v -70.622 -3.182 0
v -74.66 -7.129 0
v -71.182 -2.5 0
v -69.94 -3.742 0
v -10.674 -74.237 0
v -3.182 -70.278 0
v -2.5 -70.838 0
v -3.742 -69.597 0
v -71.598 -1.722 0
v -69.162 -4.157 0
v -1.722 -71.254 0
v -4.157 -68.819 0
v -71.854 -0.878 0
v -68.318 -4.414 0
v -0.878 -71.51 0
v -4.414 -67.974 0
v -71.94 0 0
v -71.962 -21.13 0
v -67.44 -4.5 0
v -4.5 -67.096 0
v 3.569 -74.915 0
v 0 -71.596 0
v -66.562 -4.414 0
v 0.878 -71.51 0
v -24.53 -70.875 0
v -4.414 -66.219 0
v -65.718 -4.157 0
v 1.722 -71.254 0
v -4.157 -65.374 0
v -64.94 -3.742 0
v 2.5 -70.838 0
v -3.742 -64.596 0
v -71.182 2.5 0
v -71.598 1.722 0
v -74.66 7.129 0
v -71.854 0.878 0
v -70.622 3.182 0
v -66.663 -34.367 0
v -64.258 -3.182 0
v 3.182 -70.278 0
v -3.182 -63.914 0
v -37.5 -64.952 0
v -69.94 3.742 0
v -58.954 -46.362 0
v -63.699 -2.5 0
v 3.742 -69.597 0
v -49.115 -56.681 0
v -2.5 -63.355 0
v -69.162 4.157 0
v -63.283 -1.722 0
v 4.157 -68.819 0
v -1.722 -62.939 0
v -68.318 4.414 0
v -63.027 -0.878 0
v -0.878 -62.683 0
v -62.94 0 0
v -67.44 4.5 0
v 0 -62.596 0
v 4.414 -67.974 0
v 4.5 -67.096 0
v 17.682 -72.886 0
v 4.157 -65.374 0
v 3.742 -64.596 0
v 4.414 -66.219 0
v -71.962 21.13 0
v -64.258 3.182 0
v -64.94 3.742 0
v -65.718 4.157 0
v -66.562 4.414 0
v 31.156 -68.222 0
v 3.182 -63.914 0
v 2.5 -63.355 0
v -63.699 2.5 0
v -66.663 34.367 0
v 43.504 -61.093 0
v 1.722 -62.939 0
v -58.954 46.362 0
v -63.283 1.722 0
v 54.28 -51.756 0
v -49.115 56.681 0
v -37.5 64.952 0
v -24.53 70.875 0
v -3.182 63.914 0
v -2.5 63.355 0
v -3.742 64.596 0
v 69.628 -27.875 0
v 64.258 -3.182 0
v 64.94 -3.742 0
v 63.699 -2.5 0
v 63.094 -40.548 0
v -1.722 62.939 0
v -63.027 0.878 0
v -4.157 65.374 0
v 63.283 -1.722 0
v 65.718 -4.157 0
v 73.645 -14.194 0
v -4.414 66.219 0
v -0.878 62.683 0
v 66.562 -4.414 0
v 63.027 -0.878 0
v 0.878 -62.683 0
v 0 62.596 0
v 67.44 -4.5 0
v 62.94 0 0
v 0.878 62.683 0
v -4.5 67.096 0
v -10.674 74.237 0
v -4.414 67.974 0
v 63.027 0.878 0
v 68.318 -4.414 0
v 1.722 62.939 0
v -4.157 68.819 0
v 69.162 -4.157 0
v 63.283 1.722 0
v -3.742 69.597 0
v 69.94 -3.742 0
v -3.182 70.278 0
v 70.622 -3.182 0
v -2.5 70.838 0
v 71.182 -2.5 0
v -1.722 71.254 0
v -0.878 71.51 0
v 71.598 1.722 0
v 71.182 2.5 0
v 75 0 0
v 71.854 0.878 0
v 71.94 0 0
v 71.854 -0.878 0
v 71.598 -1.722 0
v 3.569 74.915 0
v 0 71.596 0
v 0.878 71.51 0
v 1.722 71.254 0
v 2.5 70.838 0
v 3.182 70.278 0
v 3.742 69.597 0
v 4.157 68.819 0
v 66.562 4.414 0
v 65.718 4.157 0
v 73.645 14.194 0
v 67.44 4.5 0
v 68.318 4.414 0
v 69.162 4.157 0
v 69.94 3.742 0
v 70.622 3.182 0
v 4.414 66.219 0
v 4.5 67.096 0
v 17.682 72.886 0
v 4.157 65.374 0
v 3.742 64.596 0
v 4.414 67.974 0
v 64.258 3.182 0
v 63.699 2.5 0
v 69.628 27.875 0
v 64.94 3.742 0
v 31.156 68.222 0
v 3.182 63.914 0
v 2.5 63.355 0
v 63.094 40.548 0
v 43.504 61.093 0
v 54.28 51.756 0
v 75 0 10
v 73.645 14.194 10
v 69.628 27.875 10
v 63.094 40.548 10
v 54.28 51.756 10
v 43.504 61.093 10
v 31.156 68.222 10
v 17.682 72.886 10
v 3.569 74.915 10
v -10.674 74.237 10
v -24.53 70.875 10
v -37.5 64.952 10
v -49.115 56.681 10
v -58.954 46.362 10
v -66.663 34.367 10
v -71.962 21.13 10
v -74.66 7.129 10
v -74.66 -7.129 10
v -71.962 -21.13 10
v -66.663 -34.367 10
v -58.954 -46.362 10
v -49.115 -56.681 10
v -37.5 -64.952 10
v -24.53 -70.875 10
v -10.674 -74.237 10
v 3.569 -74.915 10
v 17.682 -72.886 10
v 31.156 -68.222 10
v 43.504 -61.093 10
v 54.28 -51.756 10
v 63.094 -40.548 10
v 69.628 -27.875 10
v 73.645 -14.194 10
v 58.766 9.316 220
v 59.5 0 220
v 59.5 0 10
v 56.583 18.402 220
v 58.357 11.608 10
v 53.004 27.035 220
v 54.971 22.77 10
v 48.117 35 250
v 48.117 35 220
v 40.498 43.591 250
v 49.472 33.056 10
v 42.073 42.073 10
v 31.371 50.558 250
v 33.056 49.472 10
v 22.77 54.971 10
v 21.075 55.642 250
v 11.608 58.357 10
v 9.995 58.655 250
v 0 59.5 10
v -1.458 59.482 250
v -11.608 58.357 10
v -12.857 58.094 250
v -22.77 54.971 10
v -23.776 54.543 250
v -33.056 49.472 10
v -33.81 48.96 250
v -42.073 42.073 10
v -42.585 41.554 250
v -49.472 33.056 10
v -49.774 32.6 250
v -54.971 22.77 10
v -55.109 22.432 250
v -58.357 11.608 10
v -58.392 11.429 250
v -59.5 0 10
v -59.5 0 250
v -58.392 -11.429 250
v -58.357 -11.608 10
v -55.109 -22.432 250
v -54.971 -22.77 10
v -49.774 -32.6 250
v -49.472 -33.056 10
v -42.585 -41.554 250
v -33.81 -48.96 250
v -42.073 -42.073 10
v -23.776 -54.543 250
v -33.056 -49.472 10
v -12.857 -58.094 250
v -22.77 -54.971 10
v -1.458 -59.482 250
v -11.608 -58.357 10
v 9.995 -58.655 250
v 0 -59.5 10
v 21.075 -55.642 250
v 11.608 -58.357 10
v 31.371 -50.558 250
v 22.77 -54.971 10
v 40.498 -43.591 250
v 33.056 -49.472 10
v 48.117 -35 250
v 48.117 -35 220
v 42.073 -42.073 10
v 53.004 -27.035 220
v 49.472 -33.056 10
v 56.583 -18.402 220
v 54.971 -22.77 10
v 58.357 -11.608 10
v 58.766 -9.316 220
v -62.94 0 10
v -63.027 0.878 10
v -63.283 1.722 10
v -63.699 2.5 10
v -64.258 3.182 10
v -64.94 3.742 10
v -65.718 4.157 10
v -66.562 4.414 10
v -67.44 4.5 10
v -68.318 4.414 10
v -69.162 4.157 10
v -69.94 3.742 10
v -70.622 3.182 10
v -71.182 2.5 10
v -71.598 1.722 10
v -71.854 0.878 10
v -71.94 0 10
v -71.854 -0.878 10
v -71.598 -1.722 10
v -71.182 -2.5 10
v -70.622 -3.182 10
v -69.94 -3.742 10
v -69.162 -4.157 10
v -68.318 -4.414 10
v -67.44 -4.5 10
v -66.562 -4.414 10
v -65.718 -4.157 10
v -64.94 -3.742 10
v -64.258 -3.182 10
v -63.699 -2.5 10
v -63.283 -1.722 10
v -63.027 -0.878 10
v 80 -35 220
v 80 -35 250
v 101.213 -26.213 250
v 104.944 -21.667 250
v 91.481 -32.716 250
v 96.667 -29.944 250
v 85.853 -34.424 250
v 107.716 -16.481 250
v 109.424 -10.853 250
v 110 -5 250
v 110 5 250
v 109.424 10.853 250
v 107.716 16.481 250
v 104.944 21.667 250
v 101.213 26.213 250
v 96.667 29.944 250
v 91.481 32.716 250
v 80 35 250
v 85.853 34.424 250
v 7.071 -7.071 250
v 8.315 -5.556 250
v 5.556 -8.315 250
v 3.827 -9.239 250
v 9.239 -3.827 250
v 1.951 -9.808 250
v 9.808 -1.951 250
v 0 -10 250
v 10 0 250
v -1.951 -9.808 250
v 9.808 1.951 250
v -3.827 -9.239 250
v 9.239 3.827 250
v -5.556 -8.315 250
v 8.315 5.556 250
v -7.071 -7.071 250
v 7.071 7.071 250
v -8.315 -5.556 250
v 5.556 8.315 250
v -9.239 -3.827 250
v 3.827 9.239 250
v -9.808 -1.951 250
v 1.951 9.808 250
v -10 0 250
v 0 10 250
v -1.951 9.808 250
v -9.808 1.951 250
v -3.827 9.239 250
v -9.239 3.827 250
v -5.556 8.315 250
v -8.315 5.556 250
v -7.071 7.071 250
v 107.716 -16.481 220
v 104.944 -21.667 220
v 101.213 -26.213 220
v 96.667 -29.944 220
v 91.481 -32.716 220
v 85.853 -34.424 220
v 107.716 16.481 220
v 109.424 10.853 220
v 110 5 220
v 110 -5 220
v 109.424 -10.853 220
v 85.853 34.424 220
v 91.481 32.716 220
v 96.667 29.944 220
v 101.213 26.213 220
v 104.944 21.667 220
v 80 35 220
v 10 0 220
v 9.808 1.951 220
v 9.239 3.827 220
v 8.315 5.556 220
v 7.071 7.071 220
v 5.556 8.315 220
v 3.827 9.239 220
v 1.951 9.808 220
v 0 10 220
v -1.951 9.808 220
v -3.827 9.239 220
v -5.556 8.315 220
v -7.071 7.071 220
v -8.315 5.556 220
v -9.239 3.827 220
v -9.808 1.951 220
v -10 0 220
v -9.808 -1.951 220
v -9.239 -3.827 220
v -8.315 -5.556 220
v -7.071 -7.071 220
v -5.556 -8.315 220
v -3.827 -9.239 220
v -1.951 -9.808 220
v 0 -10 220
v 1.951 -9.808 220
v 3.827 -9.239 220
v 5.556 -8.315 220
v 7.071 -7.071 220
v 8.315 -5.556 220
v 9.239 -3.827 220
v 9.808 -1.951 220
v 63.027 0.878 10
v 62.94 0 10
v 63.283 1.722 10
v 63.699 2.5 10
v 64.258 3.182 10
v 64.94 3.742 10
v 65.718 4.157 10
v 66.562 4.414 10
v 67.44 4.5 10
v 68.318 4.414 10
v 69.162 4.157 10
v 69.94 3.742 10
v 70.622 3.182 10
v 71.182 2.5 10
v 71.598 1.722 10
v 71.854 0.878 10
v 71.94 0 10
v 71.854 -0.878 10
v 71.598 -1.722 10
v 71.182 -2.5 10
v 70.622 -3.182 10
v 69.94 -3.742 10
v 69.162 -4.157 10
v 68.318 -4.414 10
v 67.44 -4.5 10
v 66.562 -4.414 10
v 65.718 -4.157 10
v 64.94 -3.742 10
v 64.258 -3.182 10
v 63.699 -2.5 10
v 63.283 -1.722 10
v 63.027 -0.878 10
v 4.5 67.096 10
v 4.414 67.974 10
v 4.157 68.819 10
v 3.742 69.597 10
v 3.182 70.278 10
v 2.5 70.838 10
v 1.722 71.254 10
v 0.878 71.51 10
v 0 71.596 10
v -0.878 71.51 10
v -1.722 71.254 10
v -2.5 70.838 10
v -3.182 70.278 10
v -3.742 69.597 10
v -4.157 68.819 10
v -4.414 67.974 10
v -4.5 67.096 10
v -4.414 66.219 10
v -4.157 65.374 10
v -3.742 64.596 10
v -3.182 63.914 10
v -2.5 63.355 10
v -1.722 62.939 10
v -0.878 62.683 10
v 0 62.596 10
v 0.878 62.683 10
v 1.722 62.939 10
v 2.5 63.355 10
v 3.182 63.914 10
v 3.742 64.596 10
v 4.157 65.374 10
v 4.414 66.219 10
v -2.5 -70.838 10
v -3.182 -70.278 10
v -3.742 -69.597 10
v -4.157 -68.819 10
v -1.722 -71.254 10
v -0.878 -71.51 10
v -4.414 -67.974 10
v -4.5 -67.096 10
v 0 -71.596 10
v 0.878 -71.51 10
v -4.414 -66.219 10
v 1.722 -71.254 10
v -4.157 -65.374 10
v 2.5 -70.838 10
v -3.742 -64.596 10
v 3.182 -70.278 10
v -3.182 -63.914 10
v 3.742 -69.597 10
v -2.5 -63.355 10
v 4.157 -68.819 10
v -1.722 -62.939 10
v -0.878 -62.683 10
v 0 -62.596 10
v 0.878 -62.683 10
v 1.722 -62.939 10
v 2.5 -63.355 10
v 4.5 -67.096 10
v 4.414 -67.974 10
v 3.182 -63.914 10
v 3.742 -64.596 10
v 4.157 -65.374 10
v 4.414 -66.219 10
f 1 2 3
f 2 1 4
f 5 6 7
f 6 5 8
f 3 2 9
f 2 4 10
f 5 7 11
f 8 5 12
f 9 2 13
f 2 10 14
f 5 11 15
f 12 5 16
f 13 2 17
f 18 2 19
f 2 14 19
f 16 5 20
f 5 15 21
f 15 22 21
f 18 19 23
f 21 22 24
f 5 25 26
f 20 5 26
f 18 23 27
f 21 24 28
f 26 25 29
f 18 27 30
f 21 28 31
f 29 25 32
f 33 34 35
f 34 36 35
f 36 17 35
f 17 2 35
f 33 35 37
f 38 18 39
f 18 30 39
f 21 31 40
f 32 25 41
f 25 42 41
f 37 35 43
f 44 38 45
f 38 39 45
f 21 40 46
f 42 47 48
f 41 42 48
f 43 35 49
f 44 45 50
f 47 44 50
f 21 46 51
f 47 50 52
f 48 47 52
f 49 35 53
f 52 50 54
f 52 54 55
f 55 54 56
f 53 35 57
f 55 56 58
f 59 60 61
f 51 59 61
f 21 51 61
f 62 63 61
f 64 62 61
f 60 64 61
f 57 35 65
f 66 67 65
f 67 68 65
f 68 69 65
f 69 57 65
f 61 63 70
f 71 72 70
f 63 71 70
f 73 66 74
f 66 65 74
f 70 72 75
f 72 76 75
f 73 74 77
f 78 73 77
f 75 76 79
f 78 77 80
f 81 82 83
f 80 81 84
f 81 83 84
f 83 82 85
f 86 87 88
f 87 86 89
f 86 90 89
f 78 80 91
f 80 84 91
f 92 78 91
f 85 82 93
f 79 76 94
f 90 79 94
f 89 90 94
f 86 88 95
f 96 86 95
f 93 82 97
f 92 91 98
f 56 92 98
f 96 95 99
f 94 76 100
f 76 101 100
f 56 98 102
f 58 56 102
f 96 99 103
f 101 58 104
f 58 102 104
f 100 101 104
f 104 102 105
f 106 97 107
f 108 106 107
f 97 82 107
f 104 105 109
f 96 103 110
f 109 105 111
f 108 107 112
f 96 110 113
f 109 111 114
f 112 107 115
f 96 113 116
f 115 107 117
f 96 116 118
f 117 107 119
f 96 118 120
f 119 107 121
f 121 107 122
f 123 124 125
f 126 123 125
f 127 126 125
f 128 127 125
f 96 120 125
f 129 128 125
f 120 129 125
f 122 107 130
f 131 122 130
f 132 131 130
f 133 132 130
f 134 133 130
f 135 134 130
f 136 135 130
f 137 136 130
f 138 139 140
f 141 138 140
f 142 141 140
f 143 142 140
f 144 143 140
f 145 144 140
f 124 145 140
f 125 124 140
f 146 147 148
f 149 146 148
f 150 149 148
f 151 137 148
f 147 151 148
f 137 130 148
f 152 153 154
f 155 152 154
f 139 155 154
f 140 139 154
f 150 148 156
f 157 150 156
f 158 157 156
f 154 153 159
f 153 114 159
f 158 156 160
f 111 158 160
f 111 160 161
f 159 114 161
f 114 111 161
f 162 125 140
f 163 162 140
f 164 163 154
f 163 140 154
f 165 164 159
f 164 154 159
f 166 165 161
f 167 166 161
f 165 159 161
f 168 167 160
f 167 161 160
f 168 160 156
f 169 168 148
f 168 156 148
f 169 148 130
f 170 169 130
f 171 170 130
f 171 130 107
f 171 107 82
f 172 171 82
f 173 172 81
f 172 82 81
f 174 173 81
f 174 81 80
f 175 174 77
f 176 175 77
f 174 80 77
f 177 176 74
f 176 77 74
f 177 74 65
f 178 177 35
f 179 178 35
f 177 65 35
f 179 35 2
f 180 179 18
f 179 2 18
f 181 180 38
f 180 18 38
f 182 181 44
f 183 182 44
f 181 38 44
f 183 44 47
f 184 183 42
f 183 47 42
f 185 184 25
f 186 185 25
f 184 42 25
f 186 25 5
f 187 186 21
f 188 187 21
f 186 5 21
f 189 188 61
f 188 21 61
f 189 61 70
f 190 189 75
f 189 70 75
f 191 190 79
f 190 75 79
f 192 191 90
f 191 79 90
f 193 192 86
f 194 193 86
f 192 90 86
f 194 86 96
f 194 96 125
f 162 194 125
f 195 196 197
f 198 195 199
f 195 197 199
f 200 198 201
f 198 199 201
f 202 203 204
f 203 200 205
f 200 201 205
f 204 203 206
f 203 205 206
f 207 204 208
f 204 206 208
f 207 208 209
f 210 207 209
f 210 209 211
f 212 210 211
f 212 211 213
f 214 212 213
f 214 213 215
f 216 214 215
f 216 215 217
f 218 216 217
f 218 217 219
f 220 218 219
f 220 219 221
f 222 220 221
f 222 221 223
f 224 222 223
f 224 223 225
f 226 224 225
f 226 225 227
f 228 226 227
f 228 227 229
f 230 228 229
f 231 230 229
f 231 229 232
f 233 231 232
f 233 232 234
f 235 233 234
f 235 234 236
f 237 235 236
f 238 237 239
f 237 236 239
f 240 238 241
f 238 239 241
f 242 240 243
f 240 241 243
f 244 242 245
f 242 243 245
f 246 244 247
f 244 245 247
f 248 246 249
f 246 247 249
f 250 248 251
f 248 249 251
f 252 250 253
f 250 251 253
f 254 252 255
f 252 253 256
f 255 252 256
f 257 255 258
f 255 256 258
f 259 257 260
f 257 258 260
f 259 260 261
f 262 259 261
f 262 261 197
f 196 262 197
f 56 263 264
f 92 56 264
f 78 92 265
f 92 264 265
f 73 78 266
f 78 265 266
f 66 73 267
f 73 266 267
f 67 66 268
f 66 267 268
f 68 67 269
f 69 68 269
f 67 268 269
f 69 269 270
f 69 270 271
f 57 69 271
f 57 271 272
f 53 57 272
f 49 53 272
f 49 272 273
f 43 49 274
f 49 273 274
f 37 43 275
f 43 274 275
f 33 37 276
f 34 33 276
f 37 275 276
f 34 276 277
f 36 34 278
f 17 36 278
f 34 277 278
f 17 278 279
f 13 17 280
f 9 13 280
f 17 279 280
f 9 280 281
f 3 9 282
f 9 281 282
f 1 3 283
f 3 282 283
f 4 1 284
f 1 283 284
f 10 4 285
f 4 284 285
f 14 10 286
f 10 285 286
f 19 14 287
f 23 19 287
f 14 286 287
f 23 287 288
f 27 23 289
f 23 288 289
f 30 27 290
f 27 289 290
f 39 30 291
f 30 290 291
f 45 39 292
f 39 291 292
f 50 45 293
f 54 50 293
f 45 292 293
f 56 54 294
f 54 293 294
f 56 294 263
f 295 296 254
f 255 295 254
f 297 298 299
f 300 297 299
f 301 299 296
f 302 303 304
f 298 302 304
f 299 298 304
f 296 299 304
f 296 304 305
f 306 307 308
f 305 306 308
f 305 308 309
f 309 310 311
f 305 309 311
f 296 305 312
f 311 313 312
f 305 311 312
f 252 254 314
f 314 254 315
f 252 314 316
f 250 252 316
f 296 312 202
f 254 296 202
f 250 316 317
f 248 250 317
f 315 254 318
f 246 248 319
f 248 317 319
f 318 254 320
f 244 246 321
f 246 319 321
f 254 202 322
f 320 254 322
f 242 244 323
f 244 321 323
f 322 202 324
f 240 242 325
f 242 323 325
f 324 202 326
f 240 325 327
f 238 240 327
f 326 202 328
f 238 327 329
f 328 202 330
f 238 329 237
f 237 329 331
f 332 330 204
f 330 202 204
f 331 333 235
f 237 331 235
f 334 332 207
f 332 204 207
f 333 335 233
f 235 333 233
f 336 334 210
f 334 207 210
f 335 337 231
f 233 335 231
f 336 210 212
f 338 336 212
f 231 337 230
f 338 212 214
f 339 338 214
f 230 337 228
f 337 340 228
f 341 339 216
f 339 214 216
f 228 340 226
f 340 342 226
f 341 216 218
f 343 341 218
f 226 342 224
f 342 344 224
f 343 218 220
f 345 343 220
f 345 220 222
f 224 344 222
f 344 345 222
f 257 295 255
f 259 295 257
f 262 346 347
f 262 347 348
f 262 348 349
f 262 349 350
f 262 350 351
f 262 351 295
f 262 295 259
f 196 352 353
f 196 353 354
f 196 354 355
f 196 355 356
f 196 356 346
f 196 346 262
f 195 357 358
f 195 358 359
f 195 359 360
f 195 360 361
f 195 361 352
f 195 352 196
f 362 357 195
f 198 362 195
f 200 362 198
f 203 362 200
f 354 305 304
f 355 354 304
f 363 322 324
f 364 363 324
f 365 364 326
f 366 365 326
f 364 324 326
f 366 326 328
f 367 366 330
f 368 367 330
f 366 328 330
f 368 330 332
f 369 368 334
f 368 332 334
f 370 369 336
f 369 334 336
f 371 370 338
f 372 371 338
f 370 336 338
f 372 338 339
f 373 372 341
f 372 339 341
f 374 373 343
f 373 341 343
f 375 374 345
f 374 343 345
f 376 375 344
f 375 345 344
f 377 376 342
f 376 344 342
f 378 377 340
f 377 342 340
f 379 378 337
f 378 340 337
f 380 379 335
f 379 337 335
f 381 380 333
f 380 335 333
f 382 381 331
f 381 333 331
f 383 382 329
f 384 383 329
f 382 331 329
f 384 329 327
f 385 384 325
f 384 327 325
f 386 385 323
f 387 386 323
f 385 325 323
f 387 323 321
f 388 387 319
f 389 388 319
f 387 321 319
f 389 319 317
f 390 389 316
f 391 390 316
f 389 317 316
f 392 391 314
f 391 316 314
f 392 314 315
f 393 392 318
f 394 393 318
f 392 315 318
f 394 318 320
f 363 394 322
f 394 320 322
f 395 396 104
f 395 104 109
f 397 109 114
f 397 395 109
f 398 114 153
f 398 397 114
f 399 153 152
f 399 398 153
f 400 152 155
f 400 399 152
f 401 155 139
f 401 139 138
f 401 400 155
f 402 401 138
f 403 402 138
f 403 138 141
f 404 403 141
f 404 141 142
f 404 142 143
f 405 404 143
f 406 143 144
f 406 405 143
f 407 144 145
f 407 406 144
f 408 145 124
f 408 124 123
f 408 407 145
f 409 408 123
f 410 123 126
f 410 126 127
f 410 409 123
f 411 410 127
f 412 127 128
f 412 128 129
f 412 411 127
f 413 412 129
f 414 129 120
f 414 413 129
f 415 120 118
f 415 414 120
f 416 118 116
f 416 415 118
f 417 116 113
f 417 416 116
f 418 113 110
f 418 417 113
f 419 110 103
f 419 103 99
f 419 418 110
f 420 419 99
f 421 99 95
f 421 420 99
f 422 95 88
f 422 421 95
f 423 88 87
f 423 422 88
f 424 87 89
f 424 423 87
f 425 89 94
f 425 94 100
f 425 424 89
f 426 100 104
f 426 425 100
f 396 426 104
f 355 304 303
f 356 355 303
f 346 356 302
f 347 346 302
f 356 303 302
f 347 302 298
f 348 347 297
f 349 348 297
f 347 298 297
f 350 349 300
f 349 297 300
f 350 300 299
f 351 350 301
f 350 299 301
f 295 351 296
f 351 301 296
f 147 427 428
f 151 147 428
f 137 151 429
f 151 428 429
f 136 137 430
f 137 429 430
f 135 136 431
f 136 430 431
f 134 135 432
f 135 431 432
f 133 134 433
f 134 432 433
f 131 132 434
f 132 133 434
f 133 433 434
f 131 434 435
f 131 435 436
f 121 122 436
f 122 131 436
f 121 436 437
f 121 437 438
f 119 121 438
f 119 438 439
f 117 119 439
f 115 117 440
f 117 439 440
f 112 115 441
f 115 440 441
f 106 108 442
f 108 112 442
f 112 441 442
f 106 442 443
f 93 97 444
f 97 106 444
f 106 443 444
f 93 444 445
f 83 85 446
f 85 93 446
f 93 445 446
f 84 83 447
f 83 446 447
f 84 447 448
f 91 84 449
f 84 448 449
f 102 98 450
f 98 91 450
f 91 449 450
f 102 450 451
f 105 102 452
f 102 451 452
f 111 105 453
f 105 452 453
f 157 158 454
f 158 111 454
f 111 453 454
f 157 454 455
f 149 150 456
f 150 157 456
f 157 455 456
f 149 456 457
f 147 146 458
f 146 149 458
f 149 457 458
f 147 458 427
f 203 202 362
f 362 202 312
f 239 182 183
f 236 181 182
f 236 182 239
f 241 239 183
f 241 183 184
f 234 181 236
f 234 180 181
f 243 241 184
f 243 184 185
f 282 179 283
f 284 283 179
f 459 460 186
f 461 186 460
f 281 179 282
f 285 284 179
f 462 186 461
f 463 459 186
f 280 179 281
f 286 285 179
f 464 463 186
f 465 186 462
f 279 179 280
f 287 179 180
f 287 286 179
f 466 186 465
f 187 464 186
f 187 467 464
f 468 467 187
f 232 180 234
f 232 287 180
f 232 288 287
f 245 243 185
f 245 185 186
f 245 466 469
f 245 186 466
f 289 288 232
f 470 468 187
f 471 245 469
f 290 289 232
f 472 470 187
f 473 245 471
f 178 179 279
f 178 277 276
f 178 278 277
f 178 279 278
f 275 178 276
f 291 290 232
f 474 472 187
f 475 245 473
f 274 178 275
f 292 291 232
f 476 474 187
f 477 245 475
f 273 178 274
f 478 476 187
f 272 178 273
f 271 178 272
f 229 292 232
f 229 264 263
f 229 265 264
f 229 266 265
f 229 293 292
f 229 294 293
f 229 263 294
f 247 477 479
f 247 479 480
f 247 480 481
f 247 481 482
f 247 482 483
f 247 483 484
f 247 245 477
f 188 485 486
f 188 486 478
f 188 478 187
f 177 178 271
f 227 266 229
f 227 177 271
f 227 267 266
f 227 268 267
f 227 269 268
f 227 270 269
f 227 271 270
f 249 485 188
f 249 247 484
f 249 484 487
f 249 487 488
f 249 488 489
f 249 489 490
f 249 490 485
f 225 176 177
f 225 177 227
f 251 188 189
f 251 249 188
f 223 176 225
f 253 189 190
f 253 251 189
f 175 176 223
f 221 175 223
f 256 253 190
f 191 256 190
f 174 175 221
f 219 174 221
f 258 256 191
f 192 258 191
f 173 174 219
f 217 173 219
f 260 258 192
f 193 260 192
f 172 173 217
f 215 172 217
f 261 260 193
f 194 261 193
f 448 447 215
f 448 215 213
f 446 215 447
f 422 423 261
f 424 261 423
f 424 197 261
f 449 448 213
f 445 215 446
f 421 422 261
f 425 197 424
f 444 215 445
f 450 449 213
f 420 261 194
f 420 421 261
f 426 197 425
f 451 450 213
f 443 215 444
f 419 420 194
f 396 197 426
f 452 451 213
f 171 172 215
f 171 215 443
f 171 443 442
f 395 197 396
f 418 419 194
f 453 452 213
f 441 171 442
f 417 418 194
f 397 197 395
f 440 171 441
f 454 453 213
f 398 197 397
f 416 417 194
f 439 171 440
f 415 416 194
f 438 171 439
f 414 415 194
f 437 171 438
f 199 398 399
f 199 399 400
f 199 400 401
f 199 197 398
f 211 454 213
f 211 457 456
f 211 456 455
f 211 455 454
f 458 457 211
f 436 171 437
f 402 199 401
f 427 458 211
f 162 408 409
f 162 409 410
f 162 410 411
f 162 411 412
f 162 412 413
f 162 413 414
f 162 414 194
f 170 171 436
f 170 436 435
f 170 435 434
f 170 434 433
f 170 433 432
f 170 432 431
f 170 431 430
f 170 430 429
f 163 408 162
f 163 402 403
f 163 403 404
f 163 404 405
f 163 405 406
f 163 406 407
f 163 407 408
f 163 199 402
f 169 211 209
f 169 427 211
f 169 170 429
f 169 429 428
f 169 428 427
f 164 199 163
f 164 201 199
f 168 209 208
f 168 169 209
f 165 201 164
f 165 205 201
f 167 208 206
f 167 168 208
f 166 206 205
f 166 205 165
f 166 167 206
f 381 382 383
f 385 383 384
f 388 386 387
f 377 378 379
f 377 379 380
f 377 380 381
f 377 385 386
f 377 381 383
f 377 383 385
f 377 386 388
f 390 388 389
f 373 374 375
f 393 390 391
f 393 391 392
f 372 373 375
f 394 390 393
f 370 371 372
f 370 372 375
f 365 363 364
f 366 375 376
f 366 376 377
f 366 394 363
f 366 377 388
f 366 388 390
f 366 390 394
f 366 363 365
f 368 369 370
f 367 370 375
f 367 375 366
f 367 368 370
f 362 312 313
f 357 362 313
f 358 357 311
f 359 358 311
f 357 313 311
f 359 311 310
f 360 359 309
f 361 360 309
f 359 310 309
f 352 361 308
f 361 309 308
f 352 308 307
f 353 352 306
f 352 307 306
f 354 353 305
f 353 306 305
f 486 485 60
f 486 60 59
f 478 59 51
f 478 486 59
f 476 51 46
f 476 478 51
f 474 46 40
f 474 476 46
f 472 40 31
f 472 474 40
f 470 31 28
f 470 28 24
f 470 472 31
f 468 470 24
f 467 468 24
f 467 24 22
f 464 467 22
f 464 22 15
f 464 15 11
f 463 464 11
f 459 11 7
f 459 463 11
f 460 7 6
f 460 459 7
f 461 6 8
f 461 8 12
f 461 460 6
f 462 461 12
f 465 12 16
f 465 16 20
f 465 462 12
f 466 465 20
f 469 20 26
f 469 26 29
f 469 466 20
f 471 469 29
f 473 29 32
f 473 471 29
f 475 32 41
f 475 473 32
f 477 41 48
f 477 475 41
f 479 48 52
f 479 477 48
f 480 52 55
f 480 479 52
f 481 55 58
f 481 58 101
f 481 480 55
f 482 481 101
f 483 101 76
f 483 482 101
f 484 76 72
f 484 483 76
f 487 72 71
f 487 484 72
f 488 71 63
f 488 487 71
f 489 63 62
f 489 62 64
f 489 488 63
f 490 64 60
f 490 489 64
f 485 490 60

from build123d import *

# Parameters (mm, degrees)
SKETCH1_R             = 75
BOSS_EXTRUDE1_DEPTH   = 10
SKETCH2_R             = 59.5
BOSS_EXTRUDE2_DEPTH   = 240
BOSS_EXTRUDE3_DEPTH   = 30
SKETCH7_R             = 10
CUT_EXTRUDE1_DEPTH    = 30
SKETCH9_R             = 4.5
CUT_EXTRUDE3_DEPTH    = 10
BODY_MOVE_COPY1_ANGLE = 90


with BuildPart() as part:
    # Sketch1 → Boss-Extrude1 (new body)
    with BuildSketch(Plane(origin=(0, 0, 0), x_dir=(1, 0, 0), z_dir=(0, 1, 0))):
        Circle(SKETCH1_R)
    extrude(amount=BOSS_EXTRUDE1_DEPTH)

    # Sketch2 → Boss-Extrude2 (add)
    with BuildSketch(Plane(origin=(0, 10, 0), x_dir=(1, 0, 0), z_dir=(0, 1, 0))):
        Circle(SKETCH2_R)
    extrude(amount=BOSS_EXTRUDE2_DEPTH)

    # Sketch6 → Boss-Extrude3 (add)
    with BuildSketch(Plane(origin=(0, 250, 0), x_dir=(1, 0, 0), z_dir=(0, 1, 0))):
        with BuildLine():
            Line((48.117044797, 35), (80, 35))
            ThreePointArc((80, 35), (101.213203436, 26.213203436), (110, 5))
            Line((110, 5), (110, -5))
            ThreePointArc((110, -5), (101.213203436, -26.213203436), (80, -35))
            Line((80, -35), (48.117044797, -35))
            ThreePointArc((48.117044797, -35), (59.5, 0), (48.117044797, 35))
        make_face()
    extrude(amount=-BOSS_EXTRUDE3_DEPTH)

    # Sketch7 → Cut-Extrude1 (cut)
    with BuildSketch(Plane(origin=(0, 250, 0), x_dir=(1, 0, 0), z_dir=(0, 1, 0))):
        Circle(SKETCH7_R)
    extrude(amount=-CUT_EXTRUDE1_DEPTH, mode=Mode.SUBTRACT)

    # Sketch9 → Cut-Extrude3 (cut)
    with BuildSketch(Plane(origin=(0, 10, 0), x_dir=(1, 0, 0), z_dir=(0, 1, 0))):
        with Locations((0, 67.096454414)):
            Circle(SKETCH9_R)
        with Locations((-67.440146023, 0)):
            Circle(SKETCH9_R)
    cut_extrude3 = extrude(amount=-CUT_EXTRUDE3_DEPTH, mode=Mode.SUBTRACT)

    # Mirror2: Cut-Extrude3 across plane
    add(cut_extrude3.mirror(Plane.XY), mode=Mode.SUBTRACT)

    # Mirror3: Cut-Extrude3 across plane
    add(cut_extrude3.mirror(Plane(origin=(0, 0, 0), x_dir=(0, 0, 1), z_dir=(1, 0, 0))), mode=Mode.SUBTRACT)


with BuildPart() as part_1:
    # Body-Move/Copy1: moved
    add(part.part.rotate(Axis((0, 0, 0), (1, 0, 0)), BODY_MOVE_COPY1_ANGLE))


solid = part_1.part
